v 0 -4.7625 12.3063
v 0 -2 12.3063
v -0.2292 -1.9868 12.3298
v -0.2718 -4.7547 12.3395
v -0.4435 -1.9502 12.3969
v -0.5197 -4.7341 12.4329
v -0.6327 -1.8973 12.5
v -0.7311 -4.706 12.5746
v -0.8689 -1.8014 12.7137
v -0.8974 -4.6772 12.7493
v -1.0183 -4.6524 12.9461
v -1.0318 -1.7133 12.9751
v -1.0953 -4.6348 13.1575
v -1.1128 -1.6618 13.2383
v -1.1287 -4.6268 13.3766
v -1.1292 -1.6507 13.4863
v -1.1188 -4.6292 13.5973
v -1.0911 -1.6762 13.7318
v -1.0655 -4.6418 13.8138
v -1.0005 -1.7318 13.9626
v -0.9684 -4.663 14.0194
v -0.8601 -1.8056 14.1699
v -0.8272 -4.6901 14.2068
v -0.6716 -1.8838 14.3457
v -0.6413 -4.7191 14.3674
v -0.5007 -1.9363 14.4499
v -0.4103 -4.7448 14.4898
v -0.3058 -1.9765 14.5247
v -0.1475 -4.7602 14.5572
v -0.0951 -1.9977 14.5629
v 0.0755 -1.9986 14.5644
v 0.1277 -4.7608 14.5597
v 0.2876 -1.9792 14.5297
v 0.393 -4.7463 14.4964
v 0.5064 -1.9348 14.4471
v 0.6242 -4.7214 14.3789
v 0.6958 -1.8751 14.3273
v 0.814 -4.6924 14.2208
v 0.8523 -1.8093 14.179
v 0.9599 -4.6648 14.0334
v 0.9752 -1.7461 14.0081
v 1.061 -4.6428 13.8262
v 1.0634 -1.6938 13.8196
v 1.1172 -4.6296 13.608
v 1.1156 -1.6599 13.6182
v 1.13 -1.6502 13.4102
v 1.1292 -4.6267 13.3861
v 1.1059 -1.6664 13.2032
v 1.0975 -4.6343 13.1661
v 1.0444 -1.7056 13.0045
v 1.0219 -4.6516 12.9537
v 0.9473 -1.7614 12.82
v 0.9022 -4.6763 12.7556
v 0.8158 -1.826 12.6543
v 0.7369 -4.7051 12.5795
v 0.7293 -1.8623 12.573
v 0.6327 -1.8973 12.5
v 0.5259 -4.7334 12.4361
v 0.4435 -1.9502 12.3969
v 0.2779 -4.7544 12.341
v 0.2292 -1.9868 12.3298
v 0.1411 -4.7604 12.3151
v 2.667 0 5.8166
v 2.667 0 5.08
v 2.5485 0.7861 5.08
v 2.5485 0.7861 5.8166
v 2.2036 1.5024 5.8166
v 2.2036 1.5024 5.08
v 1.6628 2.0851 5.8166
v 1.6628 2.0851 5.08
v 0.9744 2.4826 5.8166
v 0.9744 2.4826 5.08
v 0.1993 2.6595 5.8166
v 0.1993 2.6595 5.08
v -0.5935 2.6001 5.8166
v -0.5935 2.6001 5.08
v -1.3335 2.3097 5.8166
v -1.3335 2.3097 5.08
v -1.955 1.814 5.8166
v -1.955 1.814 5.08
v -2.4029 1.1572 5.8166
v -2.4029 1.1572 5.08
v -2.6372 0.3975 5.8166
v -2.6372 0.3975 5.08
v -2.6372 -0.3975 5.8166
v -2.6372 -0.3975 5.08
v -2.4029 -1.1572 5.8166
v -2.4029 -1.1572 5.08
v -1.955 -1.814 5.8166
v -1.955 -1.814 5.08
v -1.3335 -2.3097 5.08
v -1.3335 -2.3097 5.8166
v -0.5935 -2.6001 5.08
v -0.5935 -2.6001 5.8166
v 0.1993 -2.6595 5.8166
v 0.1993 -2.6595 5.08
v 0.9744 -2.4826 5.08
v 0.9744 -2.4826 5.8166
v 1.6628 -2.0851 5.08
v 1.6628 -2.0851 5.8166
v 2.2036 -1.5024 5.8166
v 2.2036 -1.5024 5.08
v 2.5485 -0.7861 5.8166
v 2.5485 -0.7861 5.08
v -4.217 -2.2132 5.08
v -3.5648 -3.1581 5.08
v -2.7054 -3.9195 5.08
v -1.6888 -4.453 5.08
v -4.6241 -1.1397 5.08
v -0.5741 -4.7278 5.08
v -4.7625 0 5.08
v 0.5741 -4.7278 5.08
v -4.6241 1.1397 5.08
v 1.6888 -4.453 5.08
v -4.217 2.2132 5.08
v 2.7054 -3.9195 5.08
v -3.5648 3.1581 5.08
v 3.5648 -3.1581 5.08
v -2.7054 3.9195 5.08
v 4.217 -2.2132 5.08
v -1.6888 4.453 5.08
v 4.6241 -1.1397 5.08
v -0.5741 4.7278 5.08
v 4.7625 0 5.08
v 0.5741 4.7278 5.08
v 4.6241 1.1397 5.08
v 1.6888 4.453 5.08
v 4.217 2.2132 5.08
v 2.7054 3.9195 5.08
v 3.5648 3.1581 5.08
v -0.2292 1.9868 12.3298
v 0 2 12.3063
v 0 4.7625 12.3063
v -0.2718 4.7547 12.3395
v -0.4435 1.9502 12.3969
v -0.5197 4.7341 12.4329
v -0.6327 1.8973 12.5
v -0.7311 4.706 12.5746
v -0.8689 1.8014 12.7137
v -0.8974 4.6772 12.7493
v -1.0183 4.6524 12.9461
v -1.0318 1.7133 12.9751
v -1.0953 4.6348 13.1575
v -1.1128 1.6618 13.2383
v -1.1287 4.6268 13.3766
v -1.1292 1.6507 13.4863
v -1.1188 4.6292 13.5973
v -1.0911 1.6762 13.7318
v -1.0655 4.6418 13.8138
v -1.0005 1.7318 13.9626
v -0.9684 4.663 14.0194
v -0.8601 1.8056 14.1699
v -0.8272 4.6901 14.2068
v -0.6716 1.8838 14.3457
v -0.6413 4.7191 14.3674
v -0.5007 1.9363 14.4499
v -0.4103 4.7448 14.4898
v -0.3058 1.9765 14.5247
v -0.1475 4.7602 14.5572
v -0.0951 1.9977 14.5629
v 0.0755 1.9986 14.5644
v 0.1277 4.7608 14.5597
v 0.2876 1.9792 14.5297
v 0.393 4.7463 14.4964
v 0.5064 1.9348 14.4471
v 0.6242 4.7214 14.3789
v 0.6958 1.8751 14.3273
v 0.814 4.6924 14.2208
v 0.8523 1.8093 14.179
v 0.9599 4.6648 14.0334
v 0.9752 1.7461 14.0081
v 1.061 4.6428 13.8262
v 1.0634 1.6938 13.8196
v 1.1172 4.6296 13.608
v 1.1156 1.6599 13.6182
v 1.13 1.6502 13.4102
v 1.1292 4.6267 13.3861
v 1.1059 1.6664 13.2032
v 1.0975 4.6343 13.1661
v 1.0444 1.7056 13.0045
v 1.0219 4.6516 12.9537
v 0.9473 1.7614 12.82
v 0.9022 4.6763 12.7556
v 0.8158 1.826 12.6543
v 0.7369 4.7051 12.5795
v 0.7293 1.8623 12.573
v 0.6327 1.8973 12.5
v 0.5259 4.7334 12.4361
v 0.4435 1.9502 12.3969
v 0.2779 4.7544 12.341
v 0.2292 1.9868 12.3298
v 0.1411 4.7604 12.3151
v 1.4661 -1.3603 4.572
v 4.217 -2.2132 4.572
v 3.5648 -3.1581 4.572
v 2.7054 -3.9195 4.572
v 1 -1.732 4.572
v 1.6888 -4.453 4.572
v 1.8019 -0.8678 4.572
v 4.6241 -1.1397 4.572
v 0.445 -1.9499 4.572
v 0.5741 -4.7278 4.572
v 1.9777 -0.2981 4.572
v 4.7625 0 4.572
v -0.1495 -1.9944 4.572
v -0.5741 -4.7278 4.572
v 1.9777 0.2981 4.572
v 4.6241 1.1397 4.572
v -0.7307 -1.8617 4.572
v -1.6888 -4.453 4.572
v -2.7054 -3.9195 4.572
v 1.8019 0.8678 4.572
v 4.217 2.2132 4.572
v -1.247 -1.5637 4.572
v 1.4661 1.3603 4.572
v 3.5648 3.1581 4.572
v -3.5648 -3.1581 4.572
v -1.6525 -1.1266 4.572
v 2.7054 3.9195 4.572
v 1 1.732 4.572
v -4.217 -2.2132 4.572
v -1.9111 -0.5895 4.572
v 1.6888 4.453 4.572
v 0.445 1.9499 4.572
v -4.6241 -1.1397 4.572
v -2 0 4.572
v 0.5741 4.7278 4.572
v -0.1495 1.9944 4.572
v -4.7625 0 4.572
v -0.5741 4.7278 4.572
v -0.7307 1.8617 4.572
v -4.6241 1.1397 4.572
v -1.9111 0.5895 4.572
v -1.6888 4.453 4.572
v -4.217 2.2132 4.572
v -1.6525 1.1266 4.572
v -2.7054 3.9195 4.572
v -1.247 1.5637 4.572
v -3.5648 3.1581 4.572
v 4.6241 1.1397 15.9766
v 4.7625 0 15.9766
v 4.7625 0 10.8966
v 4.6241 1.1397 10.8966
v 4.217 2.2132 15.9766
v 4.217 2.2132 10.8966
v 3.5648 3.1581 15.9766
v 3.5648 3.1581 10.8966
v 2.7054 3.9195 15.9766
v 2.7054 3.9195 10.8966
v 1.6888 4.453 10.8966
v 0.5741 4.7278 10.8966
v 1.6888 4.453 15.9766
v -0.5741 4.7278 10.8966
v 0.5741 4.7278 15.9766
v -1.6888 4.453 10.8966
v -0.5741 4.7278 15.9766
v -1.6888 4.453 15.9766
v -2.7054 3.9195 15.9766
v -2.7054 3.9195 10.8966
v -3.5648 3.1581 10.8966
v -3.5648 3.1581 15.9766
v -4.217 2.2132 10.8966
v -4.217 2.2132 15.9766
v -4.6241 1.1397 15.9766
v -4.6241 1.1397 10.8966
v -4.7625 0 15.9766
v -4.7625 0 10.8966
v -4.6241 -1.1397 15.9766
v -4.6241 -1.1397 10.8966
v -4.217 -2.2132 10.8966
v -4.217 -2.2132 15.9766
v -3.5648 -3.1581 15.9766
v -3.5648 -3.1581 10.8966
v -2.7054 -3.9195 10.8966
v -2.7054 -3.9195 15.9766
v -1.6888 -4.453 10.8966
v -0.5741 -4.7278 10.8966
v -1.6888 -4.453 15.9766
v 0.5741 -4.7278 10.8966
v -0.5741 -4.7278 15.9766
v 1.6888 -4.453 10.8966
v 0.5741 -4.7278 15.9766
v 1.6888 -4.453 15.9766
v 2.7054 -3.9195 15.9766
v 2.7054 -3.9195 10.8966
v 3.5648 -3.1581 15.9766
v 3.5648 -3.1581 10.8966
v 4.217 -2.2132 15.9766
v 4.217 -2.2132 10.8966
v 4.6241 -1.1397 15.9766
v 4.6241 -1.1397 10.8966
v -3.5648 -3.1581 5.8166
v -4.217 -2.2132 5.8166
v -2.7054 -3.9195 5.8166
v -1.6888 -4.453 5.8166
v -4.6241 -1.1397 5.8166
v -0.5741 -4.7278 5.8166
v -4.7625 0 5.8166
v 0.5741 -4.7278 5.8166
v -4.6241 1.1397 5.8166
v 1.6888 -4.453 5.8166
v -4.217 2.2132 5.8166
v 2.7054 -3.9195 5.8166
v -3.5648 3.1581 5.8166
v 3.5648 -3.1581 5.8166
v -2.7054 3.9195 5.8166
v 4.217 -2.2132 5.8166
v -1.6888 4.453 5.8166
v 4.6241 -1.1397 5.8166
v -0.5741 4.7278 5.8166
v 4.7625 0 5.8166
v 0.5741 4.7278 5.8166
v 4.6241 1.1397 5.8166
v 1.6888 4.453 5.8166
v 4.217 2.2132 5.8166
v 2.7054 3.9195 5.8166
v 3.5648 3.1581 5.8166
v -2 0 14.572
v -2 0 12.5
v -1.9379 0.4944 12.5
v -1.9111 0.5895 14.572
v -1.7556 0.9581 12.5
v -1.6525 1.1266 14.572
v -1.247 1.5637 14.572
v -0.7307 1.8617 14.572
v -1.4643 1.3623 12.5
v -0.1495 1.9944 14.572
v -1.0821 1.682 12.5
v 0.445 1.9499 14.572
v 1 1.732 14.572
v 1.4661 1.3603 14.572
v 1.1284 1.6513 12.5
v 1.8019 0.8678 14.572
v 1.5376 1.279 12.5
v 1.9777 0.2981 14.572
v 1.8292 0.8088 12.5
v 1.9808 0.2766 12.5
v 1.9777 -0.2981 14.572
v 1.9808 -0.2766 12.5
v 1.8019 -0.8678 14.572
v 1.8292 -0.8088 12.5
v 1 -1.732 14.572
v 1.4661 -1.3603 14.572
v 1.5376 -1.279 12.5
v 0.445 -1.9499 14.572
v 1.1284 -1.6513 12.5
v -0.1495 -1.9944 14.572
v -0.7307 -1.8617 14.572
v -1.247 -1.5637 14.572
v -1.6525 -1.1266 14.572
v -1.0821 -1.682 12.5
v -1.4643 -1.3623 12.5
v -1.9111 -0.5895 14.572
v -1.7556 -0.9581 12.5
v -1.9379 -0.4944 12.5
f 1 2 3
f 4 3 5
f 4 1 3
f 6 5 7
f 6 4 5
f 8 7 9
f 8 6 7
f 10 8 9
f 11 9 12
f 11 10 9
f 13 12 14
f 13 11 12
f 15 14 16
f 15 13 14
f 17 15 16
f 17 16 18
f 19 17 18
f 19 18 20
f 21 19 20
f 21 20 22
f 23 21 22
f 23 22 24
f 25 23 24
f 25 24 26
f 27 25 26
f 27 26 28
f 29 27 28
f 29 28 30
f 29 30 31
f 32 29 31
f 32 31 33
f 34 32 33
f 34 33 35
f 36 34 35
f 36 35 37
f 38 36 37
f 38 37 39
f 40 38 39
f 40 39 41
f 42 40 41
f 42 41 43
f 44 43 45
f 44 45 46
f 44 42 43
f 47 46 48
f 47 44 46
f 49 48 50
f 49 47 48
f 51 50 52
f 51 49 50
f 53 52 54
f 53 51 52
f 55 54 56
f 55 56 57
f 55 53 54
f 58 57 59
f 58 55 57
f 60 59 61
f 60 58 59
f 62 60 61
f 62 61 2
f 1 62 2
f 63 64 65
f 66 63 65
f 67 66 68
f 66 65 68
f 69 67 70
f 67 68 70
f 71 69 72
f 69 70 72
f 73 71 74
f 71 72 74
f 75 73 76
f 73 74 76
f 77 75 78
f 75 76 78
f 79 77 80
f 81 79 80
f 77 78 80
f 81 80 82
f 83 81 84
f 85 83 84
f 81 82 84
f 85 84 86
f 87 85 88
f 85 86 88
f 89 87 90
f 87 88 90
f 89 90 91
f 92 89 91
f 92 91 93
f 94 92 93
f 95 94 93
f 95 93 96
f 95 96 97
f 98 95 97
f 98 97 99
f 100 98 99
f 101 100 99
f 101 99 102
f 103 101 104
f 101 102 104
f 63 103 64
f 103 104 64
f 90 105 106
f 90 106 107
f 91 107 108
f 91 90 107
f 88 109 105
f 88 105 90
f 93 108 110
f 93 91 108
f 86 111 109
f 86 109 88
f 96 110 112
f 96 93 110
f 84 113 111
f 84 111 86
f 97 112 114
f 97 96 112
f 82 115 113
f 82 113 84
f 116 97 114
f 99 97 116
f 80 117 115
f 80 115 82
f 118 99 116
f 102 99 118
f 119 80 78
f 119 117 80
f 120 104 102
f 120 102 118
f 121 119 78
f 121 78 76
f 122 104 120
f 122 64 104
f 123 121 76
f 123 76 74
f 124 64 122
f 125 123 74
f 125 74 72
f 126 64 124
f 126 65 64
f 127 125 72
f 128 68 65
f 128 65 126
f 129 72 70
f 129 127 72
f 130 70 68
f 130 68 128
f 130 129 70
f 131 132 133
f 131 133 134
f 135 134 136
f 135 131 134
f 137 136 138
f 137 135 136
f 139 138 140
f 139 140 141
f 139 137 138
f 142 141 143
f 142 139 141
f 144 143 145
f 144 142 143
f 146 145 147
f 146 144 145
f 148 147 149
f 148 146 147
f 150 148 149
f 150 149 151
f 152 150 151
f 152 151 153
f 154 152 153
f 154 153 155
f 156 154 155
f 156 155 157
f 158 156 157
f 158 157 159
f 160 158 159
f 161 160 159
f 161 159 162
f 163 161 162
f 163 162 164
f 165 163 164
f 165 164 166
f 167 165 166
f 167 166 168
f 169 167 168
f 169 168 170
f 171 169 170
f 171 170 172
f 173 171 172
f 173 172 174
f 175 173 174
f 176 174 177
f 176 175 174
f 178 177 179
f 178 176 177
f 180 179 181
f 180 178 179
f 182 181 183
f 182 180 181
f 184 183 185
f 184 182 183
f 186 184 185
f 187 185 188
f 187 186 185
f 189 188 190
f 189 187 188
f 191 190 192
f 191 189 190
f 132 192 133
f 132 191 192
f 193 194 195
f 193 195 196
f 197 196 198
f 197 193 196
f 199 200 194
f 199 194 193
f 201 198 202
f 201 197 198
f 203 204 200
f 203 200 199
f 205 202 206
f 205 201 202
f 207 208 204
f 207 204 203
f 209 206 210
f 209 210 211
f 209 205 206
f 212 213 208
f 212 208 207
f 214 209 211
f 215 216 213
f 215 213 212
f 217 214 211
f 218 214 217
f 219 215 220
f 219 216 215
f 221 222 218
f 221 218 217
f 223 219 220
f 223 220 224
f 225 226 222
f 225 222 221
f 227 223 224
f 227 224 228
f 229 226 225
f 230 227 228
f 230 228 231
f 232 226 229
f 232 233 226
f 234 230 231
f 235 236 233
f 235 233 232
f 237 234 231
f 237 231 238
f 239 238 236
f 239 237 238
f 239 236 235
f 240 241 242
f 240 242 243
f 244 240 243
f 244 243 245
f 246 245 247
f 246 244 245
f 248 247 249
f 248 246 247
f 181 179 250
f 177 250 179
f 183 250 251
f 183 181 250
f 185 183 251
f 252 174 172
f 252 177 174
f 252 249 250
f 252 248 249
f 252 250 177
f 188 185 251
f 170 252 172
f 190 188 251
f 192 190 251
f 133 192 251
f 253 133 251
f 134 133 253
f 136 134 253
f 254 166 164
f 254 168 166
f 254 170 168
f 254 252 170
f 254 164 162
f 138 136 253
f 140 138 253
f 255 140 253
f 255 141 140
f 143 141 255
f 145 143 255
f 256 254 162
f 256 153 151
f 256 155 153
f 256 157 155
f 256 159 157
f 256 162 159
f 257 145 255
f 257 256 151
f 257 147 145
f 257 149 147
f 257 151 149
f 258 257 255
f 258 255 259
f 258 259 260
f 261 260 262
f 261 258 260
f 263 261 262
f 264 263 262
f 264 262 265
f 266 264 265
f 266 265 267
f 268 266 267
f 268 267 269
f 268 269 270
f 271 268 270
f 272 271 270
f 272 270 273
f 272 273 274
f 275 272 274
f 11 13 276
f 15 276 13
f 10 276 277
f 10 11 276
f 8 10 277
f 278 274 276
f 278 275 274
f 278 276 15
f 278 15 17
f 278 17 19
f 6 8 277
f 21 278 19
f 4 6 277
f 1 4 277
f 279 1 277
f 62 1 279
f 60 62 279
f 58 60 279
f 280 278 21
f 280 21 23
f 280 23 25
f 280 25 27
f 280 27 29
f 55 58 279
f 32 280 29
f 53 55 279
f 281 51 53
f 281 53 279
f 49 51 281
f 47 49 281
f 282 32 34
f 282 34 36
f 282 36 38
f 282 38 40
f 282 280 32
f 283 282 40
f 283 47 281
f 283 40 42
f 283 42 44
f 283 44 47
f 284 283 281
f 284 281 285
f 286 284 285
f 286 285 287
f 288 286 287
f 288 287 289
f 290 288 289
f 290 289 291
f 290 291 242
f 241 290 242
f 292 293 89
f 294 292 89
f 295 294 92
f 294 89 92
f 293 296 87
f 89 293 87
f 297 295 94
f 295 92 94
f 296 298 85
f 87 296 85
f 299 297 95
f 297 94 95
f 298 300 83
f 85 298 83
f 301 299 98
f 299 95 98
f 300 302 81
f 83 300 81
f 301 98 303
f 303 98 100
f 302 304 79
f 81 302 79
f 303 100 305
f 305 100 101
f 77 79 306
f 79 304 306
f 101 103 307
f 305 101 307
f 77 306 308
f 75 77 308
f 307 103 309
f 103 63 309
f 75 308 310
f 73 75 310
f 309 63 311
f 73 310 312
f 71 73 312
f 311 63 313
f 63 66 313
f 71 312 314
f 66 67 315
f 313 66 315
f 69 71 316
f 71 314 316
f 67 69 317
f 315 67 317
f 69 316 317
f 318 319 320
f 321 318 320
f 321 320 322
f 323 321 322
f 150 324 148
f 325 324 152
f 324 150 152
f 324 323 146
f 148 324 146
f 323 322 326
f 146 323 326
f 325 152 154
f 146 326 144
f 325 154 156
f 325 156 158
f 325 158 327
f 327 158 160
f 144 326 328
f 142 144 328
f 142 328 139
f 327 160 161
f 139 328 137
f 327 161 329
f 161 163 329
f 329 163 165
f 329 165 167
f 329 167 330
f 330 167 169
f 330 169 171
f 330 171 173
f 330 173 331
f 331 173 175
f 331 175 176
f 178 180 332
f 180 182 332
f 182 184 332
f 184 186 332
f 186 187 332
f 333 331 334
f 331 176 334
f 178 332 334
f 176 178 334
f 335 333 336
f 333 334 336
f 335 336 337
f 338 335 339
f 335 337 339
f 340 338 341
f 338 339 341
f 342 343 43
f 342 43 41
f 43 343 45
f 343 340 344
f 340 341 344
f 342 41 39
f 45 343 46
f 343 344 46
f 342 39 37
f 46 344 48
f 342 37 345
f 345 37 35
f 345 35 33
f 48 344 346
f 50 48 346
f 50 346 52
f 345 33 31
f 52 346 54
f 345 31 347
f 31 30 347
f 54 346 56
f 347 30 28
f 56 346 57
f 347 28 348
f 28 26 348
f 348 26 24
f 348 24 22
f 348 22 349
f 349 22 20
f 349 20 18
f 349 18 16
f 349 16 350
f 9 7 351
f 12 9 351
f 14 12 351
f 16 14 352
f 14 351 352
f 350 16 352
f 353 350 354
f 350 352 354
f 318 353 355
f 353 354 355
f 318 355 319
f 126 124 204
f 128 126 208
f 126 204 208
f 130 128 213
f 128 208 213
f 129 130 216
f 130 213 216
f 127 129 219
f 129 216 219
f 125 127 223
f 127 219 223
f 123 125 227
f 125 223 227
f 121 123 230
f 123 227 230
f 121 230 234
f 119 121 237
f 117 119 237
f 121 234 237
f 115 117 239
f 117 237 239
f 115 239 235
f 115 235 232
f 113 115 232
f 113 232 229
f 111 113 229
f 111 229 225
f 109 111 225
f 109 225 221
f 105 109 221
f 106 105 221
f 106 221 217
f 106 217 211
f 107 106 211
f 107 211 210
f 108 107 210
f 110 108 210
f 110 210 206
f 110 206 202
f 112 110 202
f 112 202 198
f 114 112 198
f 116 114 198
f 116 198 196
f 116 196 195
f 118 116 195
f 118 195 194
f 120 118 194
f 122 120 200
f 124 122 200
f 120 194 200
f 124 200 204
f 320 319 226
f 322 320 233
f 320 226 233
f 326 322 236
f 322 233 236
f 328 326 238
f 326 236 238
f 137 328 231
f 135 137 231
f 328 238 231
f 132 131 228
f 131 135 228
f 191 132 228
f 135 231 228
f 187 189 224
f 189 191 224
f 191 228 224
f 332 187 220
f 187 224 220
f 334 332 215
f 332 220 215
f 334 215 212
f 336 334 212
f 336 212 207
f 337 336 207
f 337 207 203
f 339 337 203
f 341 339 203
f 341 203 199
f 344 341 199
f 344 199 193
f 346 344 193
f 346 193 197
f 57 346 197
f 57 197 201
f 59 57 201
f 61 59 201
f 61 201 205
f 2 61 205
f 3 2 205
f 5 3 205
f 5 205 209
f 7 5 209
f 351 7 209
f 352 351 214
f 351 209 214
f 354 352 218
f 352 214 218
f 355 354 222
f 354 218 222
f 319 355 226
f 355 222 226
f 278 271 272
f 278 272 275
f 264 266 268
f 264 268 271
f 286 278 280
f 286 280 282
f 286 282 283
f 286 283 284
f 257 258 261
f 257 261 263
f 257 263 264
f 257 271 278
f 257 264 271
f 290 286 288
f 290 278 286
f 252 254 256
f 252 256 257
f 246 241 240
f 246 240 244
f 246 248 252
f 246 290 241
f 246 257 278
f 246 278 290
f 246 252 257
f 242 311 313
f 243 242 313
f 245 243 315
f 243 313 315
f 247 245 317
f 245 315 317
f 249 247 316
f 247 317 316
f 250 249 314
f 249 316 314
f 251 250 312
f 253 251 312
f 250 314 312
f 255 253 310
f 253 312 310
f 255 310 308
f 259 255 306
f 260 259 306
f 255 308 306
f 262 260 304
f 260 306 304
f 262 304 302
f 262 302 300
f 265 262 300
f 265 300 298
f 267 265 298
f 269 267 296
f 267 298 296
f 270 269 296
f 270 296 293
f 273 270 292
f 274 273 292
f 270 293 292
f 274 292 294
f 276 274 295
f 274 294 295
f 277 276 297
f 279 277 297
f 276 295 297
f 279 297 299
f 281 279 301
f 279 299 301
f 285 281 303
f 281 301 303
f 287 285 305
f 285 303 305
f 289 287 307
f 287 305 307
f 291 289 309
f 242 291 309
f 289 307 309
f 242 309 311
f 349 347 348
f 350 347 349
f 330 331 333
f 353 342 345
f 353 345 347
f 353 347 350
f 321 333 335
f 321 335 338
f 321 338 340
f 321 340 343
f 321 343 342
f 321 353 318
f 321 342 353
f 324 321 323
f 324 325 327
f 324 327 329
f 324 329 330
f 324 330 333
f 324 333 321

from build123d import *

# Parameters (mm, degrees)
SKETCH1_R               = 4.7625
BOSS_EXTRUDE1_DEPTH     = 5.08
SKETCH2_R               = 2.667
BOSS_EXTRUDE2_DEPTH     = 0.7366
SKETCH3_R               = 4.7625
BOSS_EXTRUDE3_DEPTH     = 5.08
CUT_EXTRUDE1_DEPTH      = 6.35
CUT_EXTRUDE1_DEPTH_BACK = 6.35
SKETCH6_R               = 1.1303
SKETCH7_R               = 3.5000057
CUT_EXTRUDE2_DEPTH      = 2.50000008
SKETCH8_R               = 1.999996
CUT_EXTRUDE3_DEPTH      = 10.0000054
SKETCH9_R               = 4.7625
CUT_EXTRUDE4_DEPTH      = 4.572
SKETCH10_R              = 1.999996
CUT_EXTRUDE5_DEPTH      = 10.0000054


with BuildPart() as part:
    # Sketch1 → Boss-Extrude1 (new body)
    with BuildSketch(Plane.XY):
        Circle(SKETCH1_R)
    extrude(amount=BOSS_EXTRUDE1_DEPTH)

    # Sketch2 → Boss-Extrude2 (add)
    with BuildSketch(Plane.XY.offset(5.08)):
        Circle(SKETCH2_R)
    extrude(amount=BOSS_EXTRUDE2_DEPTH)

    # Sketch3 → Boss-Extrude3 (add)
    with BuildSketch(Plane.XY.offset(5.8166)):
        Circle(SKETCH3_R)
    boss_extrude3 = extrude(amount=BOSS_EXTRUDE3_DEPTH)

    # Mirror3: Boss-Extrude3 across plane
    add(boss_extrude3.mirror(Plane.XY.offset(10.8966)))

    # Sketch6 → Cut-Extrude1 (cut, two sides: drawn at the far end of the back side and taken through both)
    with BuildSketch(Plane(origin=(0, 0, 0), x_dir=(1, 0, 0), z_dir=(0, 1, 0)).offset(-CUT_EXTRUDE1_DEPTH_BACK)):
        with Locations(Location((0, -13.4366, 0), (0, 0, 90))):
            Circle(SKETCH6_R)
    extrude(amount=CUT_EXTRUDE1_DEPTH + CUT_EXTRUDE1_DEPTH_BACK, mode=Mode.SUBTRACT)

    # Sketch7 → Cut-Extrude2 (cut)
    with BuildSketch(Plane(origin=(0, 0, 0), x_dir=(-1, 0, 0), z_dir=(0, 0, -1))):
        Circle(SKETCH7_R)
    extrude(amount=-CUT_EXTRUDE2_DEPTH, mode=Mode.SUBTRACT)

    # Sketch8 → Cut-Extrude3 (cut)
    with BuildSketch(Plane(origin=(0, 0, 2.50000008), x_dir=(-1, 0, 0), z_dir=(0, 0, -1))):
        Circle(SKETCH8_R)
    extrude(amount=-CUT_EXTRUDE3_DEPTH, mode=Mode.SUBTRACT)

    # Sketch9 → Cut-Extrude4 (cut)
    with BuildSketch(Plane(origin=(0, 0, 0), x_dir=(-1, 0, 0), z_dir=(0, 0, -1))):
        Circle(SKETCH9_R)
    extrude(amount=-CUT_EXTRUDE4_DEPTH, mode=Mode.SUBTRACT)

    # Sketch10 → Cut-Extrude5 (cut)
    with BuildSketch(Plane(origin=(0, 0, 4.572), x_dir=(-1, 0, 0), z_dir=(0, 0, -1))):
        Circle(SKETCH10_R)
    extrude(amount=-CUT_EXTRUDE5_DEPTH, mode=Mode.SUBTRACT)


solid = part.part
